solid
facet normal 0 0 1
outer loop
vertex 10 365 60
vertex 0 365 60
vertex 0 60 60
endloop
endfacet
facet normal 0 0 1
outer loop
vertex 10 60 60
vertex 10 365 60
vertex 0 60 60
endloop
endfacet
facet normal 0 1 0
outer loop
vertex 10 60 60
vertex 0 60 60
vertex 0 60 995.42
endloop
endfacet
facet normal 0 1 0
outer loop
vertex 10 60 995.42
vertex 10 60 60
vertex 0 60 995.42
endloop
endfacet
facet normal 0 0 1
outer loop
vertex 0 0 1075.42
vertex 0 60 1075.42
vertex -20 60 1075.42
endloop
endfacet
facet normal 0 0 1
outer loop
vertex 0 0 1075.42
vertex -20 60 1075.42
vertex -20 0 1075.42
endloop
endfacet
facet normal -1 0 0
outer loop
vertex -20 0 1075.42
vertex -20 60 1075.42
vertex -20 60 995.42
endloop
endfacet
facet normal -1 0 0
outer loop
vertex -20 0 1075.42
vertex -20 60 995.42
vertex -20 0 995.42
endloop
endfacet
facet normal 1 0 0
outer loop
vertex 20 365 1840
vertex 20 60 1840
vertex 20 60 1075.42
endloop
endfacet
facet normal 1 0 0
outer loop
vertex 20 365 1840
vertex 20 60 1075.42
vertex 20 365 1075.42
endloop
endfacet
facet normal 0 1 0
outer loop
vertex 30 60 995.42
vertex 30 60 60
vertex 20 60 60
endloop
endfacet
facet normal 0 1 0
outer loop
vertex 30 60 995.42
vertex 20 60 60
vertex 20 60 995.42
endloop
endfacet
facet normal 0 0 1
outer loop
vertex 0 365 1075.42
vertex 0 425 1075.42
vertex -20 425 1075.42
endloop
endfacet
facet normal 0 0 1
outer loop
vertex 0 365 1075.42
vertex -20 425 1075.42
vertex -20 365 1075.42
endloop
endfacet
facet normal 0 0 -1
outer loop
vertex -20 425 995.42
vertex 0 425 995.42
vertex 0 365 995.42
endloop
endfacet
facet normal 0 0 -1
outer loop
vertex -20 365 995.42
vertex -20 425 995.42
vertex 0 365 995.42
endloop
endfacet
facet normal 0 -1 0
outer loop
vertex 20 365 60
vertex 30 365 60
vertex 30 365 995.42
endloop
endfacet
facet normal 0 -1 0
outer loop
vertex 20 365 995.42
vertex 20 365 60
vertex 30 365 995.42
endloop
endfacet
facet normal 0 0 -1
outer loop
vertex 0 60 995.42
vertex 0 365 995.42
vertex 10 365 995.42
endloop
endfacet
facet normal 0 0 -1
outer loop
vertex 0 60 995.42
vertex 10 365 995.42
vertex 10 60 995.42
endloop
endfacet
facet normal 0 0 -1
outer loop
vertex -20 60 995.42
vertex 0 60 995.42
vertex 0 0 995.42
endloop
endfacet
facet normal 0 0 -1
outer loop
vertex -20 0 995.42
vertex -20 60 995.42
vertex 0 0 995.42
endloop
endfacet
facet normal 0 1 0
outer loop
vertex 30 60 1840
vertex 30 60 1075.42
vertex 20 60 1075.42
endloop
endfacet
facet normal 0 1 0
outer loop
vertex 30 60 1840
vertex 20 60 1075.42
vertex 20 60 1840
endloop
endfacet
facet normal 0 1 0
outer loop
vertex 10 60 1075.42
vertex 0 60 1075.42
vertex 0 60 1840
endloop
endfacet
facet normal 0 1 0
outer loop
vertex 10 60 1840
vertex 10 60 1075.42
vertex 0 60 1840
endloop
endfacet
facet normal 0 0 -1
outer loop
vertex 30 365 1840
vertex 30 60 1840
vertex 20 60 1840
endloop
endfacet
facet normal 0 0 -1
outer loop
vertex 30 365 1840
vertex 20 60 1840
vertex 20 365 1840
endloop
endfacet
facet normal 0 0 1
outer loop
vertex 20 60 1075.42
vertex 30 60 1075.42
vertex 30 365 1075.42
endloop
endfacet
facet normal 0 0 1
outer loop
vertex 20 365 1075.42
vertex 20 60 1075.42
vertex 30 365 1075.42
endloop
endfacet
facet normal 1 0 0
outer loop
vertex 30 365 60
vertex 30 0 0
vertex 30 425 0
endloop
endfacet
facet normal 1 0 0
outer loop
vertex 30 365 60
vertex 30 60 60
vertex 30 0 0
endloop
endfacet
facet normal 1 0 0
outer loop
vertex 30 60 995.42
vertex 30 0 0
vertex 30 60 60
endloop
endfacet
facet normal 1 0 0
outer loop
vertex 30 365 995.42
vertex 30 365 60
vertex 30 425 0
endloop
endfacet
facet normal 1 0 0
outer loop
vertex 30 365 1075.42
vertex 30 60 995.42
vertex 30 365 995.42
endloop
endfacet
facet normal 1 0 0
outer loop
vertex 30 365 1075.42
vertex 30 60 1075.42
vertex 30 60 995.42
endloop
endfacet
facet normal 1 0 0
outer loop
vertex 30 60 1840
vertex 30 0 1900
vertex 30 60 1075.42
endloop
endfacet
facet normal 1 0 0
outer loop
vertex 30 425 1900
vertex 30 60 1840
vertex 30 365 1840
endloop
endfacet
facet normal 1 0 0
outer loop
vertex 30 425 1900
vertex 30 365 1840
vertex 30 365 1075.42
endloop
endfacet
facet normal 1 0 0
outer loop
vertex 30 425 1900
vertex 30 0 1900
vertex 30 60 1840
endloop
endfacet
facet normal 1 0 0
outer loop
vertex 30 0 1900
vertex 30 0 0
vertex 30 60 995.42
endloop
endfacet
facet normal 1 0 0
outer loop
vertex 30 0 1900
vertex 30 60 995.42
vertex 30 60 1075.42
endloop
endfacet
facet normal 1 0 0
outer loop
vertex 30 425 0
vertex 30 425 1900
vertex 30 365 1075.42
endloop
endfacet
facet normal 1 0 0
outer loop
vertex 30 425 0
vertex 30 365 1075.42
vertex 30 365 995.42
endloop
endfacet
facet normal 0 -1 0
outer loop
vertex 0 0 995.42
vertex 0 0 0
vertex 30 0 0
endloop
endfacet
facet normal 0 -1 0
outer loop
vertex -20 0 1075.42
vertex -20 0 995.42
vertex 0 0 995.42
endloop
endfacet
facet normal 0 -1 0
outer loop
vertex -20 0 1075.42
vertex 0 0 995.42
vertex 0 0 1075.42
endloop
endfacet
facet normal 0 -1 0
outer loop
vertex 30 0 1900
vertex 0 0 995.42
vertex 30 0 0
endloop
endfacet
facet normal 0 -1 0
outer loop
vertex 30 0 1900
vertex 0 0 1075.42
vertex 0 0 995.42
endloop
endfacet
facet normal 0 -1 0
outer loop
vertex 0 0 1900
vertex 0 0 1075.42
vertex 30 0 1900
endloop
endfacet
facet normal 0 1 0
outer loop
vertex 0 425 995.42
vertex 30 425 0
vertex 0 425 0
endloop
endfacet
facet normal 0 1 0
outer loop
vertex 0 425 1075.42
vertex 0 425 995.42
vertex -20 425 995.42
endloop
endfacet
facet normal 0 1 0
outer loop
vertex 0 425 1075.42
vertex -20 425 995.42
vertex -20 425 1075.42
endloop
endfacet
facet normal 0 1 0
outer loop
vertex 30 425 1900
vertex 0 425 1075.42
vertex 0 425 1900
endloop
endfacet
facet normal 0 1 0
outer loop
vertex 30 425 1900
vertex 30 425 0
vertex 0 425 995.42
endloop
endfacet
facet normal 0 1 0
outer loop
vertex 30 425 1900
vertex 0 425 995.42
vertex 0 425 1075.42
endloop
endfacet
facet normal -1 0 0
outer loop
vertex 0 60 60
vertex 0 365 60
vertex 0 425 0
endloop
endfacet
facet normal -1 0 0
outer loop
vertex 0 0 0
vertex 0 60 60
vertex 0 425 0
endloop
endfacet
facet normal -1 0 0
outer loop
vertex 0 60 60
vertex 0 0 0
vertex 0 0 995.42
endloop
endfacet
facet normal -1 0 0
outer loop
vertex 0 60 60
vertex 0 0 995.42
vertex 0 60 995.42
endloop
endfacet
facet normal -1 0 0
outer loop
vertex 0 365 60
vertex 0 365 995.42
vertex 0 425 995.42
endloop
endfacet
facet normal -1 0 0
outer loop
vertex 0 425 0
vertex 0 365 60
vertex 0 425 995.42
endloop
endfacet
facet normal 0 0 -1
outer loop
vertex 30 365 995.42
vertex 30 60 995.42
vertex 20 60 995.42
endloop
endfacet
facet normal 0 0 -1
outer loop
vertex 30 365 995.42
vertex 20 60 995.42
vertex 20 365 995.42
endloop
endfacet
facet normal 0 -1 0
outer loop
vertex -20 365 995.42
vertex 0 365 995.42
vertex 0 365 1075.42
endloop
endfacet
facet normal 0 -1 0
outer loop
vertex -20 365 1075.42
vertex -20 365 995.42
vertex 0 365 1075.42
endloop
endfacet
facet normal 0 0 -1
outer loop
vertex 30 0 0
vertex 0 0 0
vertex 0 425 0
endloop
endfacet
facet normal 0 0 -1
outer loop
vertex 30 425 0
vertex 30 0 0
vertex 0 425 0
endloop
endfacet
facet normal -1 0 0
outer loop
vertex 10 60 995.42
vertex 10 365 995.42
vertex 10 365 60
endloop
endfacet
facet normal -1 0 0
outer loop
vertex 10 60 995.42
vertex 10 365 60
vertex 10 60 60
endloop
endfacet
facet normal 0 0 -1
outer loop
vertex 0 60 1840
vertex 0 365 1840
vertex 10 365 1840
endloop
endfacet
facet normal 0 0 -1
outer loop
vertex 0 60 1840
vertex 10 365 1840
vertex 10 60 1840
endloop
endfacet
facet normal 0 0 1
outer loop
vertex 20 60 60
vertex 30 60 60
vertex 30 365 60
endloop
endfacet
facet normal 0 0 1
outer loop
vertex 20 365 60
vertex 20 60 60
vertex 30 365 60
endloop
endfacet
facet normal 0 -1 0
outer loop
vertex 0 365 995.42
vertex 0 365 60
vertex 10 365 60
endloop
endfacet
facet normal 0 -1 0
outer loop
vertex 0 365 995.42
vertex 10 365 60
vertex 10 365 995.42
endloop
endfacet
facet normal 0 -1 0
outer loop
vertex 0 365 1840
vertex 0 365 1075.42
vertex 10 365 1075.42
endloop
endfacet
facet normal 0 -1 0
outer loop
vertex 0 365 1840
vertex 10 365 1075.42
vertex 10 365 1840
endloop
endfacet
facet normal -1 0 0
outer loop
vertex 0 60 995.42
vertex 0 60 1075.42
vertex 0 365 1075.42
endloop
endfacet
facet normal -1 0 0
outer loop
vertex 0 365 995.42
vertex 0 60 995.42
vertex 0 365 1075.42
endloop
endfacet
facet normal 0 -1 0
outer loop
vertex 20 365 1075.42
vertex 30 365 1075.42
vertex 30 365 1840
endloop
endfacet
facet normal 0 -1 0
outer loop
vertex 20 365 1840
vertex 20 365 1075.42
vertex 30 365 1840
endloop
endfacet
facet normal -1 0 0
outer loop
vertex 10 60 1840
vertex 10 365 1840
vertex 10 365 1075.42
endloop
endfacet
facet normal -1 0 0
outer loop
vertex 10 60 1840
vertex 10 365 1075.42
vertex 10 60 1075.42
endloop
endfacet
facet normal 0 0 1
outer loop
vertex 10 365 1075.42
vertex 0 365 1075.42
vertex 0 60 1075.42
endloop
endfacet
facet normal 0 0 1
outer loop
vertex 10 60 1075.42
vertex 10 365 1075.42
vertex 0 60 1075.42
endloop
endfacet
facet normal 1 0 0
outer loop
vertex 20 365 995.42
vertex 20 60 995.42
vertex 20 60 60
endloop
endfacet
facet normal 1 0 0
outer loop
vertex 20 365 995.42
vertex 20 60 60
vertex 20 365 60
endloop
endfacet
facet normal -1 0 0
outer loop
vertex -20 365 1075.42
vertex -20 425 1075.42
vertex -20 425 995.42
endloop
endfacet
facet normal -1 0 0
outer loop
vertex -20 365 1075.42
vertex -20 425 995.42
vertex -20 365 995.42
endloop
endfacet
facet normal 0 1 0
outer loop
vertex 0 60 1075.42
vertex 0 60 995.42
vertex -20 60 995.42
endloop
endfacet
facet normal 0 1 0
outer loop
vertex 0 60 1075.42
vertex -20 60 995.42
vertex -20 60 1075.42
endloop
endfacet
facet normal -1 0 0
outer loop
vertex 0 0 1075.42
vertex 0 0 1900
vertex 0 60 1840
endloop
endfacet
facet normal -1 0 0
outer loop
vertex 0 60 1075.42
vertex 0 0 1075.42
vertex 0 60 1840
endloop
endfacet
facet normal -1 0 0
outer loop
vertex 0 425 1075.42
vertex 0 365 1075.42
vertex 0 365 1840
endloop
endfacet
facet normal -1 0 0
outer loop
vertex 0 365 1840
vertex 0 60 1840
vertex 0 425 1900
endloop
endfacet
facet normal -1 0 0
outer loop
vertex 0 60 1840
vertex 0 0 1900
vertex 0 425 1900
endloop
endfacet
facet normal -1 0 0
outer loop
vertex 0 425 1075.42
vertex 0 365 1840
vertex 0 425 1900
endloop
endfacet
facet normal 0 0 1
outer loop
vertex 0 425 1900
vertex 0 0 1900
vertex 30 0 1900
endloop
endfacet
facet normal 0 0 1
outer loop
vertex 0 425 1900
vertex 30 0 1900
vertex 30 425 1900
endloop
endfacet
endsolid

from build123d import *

# Parameters (mm, degrees)
F0_W     = 425
F0_H     = 1900
F1_DEPTH = 30
F2_W     = 305
F2_H     = 764.579544
F2_H_2   = 935.420456
F3_DEPTH = 10
F4_W     = 305
F4_H     = 764.579544
F4_H_2   = 935.420456
F5_DEPTH = 10
F6_W     = 60
F6_H     = 80
F7_DEPTH = 20


with BuildPart() as f1:
    # F0 (on Right) → F1 (new body)
    with BuildSketch(Plane.YZ):
        with Locations((212.5, 950)):
            Rectangle(F0_W, F0_H)
    extrude(amount=F1_DEPTH)

    # F2 (on face) → F3 (cut)
    with BuildSketch(Plane.YZ.offset(30)):
        with Locations((212.5, 1457.710228)):
            Rectangle(F2_W, F2_H)
        with Locations((212.5, 527.710228)):
            Rectangle(F2_W, F2_H_2)
    extrude(amount=-F3_DEPTH, mode=Mode.SUBTRACT)

    # F4 (on face) → F5 (cut)
    with BuildSketch(Plane(origin=(0, 0, 0), x_dir=(0, -1, 0), z_dir=(-1, 0, 0))):
        with Locations((-212.5, 1457.710228)):
            Rectangle(F4_W, F4_H)
        with Locations((-212.5, 527.710228)):
            Rectangle(F4_W, F4_H_2)
    extrude(amount=-F5_DEPTH, mode=Mode.SUBTRACT)

    # F6 (on face) → F7 (join)
    with BuildSketch(Plane(origin=(0, 0, 0), x_dir=(0, -1, 0), z_dir=(-1, 0, 0))):
        with Locations((-395, 1035.420456)):
            Rectangle(F6_W, F6_H)
        with Locations((-30, 1035.420456)):
            Rectangle(F6_W, F6_H)
    extrude(amount=F7_DEPTH)


solid = f1.part
